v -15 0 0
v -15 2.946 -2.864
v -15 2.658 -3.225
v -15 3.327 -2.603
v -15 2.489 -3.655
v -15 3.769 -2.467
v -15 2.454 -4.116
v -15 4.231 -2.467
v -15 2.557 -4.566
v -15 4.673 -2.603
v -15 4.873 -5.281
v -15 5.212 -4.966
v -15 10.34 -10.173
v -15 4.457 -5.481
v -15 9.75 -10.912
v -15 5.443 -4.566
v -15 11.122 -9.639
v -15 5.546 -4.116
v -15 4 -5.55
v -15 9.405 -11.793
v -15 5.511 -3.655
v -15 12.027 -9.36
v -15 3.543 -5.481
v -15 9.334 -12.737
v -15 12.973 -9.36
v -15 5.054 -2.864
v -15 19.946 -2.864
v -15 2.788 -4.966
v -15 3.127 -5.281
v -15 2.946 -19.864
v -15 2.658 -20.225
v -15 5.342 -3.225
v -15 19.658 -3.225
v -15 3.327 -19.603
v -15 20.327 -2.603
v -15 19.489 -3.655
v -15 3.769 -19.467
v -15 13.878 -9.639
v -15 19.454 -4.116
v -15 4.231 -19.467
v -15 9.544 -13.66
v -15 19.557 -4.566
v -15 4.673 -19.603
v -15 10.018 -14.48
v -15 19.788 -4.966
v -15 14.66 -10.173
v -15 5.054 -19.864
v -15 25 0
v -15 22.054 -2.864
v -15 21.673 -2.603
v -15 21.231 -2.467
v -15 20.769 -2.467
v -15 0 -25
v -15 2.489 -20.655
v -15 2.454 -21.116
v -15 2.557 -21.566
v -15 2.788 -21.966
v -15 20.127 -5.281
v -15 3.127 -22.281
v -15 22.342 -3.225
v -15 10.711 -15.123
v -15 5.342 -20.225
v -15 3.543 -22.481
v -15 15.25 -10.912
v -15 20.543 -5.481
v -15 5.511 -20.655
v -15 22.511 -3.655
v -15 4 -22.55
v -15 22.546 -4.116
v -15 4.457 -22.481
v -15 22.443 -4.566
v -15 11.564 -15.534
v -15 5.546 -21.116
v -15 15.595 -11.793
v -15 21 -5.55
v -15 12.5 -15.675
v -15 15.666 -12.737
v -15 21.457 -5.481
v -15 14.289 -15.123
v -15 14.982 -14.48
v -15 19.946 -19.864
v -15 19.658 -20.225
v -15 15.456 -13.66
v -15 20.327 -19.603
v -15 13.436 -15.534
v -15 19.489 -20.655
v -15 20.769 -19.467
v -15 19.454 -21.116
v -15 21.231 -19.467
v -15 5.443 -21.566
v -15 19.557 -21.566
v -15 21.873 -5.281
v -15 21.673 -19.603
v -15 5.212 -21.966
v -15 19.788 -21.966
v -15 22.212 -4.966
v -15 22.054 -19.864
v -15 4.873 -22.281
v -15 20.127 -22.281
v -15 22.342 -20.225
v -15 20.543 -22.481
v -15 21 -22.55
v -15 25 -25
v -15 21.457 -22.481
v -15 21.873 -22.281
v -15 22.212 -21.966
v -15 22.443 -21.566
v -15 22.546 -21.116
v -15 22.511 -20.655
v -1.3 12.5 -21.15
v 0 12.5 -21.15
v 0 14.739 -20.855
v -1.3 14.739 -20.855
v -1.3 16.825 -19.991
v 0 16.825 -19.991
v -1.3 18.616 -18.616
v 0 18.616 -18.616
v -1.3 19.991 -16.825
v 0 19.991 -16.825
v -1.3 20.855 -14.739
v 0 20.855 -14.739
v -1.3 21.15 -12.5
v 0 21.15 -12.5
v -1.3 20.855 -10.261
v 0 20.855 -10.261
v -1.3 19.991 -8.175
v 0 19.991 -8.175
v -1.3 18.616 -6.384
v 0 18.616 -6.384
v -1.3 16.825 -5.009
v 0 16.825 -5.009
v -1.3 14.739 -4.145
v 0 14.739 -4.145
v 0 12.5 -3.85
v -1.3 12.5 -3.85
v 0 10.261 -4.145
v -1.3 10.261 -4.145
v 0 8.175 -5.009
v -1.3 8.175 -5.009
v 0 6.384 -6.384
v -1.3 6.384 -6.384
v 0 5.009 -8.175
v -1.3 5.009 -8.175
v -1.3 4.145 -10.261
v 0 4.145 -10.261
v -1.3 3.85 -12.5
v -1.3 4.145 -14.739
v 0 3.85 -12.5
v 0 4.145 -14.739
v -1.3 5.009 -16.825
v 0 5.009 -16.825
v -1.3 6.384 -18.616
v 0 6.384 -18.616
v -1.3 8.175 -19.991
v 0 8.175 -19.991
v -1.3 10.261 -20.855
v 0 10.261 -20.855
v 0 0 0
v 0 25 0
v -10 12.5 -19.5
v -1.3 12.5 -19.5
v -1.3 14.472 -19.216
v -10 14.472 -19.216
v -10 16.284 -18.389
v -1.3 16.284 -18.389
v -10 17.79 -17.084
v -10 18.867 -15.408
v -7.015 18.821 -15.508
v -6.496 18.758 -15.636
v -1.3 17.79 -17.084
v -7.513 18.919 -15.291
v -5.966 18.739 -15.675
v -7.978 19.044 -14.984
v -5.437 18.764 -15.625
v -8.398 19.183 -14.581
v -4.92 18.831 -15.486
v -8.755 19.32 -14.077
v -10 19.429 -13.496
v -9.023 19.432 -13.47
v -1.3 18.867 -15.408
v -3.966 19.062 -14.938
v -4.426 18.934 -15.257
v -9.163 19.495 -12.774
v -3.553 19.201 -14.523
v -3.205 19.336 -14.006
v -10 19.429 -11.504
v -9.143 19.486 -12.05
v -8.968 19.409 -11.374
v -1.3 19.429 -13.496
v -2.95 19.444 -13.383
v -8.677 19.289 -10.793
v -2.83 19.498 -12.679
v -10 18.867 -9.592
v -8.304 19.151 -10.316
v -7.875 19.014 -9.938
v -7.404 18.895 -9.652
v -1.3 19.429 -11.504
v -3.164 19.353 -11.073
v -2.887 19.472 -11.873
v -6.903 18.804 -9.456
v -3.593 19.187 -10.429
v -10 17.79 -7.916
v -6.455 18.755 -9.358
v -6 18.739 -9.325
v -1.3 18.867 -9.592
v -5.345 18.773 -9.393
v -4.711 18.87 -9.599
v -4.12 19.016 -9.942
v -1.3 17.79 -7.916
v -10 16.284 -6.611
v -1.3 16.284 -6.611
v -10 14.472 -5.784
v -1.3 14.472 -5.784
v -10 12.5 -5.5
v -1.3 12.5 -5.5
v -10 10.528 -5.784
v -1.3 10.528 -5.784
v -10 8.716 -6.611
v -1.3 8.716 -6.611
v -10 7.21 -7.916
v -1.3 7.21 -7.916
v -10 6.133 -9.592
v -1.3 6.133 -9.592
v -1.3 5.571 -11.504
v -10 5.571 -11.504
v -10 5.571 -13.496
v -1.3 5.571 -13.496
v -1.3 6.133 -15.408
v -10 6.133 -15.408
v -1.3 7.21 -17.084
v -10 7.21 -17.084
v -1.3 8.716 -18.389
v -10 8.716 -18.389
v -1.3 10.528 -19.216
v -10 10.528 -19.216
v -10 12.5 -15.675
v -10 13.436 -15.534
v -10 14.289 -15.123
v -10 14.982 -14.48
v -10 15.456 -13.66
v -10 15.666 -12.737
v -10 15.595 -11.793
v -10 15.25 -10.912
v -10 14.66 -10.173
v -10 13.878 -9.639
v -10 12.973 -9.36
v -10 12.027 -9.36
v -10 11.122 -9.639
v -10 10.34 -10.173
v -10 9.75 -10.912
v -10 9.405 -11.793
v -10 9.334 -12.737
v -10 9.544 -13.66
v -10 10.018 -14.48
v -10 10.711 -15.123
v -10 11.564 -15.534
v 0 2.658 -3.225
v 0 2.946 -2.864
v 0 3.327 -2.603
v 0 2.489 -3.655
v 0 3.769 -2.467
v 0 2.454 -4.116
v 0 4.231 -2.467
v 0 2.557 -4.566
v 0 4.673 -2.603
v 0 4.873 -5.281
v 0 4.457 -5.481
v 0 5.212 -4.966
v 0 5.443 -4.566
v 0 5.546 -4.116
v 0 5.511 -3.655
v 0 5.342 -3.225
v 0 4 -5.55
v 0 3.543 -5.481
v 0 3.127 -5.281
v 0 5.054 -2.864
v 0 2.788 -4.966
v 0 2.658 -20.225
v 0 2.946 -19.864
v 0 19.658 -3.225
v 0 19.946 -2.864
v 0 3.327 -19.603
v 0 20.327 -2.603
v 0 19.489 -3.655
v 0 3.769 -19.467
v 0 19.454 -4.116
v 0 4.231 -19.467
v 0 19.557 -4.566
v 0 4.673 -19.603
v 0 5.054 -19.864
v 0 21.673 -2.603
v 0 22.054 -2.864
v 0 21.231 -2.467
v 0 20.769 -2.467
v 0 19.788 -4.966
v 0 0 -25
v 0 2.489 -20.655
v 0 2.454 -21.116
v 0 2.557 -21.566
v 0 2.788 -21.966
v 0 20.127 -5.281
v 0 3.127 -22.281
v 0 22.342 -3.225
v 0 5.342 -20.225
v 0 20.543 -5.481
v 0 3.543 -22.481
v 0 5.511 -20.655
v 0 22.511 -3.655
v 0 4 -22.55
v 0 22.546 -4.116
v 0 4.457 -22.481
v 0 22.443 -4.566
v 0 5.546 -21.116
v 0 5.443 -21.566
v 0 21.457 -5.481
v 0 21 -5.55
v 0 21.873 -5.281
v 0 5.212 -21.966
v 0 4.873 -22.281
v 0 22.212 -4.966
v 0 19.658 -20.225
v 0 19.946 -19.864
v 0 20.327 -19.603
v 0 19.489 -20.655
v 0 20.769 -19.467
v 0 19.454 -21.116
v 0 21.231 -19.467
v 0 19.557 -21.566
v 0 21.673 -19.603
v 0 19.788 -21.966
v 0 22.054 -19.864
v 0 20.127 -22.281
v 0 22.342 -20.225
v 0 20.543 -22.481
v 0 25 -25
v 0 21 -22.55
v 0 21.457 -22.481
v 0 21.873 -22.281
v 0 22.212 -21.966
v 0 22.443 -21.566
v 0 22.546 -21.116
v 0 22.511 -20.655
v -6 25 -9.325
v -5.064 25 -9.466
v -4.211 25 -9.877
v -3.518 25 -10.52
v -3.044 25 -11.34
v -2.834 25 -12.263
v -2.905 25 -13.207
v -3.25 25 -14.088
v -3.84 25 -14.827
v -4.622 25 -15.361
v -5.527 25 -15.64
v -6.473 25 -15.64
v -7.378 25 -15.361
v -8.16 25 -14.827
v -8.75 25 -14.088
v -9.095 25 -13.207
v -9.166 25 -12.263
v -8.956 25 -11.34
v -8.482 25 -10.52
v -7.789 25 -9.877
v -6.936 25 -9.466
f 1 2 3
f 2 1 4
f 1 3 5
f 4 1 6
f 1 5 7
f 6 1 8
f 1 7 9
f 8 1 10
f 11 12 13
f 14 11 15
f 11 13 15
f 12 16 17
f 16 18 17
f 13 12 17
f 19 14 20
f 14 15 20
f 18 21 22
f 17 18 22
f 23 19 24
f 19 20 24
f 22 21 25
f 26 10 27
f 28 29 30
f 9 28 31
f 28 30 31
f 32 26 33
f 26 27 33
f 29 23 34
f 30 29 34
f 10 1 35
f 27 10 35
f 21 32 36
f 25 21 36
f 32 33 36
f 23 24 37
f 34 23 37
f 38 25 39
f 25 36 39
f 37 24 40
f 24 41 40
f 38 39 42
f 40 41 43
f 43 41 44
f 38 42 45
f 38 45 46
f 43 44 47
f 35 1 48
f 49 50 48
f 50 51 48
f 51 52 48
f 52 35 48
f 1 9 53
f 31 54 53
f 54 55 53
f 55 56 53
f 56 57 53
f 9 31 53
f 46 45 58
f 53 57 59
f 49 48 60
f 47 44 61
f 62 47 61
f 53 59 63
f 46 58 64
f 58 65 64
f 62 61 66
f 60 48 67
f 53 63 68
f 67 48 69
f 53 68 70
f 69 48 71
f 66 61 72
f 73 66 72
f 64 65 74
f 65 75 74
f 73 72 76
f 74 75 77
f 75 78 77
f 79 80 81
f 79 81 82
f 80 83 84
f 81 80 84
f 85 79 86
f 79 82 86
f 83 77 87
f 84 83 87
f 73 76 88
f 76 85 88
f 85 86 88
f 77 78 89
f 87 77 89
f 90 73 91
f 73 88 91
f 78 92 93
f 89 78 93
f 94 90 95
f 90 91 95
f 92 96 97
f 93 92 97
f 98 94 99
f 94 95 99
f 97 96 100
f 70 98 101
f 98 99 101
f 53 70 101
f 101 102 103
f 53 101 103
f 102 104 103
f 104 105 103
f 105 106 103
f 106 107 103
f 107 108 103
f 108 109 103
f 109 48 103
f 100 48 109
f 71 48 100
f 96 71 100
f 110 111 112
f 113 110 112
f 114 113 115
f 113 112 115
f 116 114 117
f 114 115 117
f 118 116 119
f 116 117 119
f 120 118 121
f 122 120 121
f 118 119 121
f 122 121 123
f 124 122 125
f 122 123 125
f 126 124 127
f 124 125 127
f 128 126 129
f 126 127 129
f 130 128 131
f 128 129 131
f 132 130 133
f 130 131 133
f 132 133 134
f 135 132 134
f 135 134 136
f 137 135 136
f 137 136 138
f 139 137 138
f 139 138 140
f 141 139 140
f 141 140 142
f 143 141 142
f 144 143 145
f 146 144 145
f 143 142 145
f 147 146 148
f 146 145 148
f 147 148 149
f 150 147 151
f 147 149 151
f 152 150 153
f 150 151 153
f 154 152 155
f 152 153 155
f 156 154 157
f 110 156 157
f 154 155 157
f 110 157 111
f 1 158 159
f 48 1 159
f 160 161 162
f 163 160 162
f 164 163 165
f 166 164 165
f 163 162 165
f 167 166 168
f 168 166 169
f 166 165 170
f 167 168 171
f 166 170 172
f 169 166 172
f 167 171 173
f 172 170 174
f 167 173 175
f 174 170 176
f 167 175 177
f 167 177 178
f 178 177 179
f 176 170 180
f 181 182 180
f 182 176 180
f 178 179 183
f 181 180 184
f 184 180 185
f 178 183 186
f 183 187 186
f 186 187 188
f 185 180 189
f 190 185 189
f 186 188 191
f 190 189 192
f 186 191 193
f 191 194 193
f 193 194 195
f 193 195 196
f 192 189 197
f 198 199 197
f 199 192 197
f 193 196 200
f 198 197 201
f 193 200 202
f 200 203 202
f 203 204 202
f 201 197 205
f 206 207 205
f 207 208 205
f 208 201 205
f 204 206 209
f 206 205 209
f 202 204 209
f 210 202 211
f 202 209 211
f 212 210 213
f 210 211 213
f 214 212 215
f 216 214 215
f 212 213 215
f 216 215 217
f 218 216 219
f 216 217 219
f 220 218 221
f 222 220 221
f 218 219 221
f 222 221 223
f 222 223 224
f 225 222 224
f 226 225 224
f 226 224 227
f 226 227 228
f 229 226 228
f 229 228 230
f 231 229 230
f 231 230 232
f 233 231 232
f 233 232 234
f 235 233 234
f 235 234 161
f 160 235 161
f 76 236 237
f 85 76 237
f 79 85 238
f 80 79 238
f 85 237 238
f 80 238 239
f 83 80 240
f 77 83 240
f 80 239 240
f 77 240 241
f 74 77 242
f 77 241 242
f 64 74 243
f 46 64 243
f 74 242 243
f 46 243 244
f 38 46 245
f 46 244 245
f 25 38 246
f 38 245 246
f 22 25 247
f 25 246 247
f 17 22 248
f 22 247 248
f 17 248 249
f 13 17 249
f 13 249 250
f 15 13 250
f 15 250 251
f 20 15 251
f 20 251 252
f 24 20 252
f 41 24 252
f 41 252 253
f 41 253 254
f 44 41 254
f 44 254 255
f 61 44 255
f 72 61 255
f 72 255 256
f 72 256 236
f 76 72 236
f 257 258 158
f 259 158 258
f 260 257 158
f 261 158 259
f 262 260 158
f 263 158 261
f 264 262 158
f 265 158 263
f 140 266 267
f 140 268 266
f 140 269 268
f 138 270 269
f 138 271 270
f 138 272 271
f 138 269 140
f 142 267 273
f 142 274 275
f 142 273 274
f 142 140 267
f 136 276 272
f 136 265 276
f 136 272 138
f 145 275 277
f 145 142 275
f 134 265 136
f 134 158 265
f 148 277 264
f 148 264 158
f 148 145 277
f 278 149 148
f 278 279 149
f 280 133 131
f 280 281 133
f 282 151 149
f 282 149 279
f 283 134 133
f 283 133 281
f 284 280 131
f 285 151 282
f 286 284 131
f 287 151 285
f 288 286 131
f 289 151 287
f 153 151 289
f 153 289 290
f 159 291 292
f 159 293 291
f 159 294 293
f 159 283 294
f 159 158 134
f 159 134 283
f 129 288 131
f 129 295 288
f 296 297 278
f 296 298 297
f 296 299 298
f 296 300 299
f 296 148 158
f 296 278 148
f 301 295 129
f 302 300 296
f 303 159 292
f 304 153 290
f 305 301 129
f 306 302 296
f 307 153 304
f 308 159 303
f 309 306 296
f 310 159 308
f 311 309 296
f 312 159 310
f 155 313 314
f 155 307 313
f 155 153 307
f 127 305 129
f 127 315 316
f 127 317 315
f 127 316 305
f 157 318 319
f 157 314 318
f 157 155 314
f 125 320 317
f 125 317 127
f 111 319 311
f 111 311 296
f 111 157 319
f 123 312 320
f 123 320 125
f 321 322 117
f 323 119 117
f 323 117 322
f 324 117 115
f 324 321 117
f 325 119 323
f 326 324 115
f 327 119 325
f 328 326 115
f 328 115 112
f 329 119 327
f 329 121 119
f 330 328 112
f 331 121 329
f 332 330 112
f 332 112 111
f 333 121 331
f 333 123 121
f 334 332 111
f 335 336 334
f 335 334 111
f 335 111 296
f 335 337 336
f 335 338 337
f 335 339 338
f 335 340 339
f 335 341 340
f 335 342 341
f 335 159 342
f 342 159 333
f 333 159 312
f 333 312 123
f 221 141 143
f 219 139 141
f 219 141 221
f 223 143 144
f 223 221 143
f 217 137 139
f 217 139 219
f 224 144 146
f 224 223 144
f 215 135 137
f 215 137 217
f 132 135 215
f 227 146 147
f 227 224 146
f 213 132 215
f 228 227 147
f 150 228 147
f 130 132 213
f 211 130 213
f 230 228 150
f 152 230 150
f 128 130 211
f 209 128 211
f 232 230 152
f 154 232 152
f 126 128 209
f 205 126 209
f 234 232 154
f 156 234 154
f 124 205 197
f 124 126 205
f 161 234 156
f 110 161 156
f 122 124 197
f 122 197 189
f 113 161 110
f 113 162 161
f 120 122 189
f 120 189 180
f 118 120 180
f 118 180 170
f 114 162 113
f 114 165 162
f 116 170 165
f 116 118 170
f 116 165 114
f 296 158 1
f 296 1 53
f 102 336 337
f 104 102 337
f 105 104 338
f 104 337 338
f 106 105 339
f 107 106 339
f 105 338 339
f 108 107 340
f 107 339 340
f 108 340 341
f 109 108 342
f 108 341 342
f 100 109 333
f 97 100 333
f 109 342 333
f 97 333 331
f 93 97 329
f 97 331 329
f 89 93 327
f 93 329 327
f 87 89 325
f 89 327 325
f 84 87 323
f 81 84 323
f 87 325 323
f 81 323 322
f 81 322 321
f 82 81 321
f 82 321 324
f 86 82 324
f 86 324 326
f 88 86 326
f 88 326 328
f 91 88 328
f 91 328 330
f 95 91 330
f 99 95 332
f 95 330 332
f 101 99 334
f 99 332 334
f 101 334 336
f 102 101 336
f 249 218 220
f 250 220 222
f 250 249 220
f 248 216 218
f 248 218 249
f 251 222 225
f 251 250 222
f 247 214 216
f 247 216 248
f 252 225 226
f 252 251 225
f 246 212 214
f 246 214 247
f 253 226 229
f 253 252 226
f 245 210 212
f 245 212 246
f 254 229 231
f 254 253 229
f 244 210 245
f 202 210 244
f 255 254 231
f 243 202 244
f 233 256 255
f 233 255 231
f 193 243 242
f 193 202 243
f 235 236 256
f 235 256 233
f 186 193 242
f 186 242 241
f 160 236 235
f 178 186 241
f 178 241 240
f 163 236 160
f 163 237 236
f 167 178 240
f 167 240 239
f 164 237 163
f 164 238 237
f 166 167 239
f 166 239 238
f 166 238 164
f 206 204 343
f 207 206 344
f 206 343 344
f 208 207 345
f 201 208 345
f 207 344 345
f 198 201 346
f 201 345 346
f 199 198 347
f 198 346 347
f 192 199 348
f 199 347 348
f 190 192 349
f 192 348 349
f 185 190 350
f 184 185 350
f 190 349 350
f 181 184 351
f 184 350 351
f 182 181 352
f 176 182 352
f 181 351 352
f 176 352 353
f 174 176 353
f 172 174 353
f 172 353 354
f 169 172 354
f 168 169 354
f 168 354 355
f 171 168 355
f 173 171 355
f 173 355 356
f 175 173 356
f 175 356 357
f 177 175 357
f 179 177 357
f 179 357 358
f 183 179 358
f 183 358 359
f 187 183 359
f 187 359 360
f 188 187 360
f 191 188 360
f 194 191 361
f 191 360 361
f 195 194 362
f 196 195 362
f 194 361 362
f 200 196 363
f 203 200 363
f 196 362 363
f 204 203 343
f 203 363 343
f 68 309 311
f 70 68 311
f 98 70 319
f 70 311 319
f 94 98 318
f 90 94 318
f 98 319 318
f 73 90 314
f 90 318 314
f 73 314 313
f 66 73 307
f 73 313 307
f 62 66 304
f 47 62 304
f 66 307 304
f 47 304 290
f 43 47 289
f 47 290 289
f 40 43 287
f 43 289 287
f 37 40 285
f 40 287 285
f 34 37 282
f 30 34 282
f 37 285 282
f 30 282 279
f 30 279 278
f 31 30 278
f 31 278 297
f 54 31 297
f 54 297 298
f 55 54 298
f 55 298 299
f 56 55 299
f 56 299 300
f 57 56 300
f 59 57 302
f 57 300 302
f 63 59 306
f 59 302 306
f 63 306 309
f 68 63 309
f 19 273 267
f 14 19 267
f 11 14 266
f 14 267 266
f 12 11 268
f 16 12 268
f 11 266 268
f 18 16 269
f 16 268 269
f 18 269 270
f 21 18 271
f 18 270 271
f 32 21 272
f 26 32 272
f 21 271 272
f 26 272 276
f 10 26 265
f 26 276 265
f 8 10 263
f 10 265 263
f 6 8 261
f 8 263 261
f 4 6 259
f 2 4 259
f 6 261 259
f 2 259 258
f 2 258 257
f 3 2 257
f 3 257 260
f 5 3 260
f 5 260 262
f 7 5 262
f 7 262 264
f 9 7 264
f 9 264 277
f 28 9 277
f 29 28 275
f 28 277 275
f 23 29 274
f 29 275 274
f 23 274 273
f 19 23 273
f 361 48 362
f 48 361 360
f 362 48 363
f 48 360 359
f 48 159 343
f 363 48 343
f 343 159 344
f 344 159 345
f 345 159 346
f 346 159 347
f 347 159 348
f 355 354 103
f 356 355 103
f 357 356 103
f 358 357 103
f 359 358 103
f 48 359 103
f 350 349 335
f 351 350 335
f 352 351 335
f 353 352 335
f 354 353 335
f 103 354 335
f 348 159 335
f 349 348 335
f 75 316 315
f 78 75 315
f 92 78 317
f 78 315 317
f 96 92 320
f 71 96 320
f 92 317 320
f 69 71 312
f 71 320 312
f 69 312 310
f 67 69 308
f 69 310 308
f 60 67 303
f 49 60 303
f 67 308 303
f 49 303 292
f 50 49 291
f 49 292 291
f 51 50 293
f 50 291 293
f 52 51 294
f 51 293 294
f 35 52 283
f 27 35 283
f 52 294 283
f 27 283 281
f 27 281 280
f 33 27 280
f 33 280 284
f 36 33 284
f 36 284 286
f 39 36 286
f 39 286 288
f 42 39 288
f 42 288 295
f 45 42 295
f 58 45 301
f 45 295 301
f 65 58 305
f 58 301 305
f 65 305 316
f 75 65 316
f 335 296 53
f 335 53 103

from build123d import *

# Parameters (mm, degrees)
SKETCH1_W          = 25
SKETCH1_H          = 25
SKETCH1_R          = 1.55
EXTRUDE1_DEPTH     = 15
SKETCH2_R          = 7
CUT_EXTRUDE1_DEPTH = 10
SKETCH3_R          = 3.175
CUT_EXTRUDE2_DEPTH = 39.405728739
SKETCH4_R          = 3.175
CUT_EXTRUDE3_DEPTH = 10
SKETCH7_R          = 8.65
CUT_EXTRUDE4_DEPTH = 1.3


with BuildPart() as part:
    # Sketch1 → Extrude1 (new body)
    with BuildSketch(Plane(origin=(0, 0, 0), x_dir=(0, 0, -1), z_dir=(1, 0, 0))):
        with Locations((12.5, 12.5)):
            Rectangle(SKETCH1_W, SKETCH1_H)
        with Locations((4, 4)):
            Circle(SKETCH1_R, mode=Mode.SUBTRACT)
        with Locations((4, 21)):
            Circle(SKETCH1_R, mode=Mode.SUBTRACT)
        with Locations((21, 21)):
            Circle(SKETCH1_R, mode=Mode.SUBTRACT)
        with Locations((21, 4)):
            Circle(SKETCH1_R, mode=Mode.SUBTRACT)
    extrude(amount=-EXTRUDE1_DEPTH)

    # Sketch2 → Cut-Extrude1 (cut)
    with BuildSketch(Plane(origin=(0, 0, 0), x_dir=(0, 0, -1), z_dir=(1, 0, 0))):
        with Locations((12.5, 12.5)):
            Circle(SKETCH2_R)
    extrude(amount=-CUT_EXTRUDE1_DEPTH, mode=Mode.SUBTRACT)

    # Sketch3 → Cut-Extrude2 (cut, through all)
    with BuildSketch(Plane(origin=(0, 0, 0), x_dir=(0, 0, -1), z_dir=(1, 0, 0))):
        with Locations((12.5, 12.5)):
            Circle(SKETCH3_R)
    extrude(amount=-CUT_EXTRUDE2_DEPTH, mode=Mode.SUBTRACT)

    # Sketch4 → Cut-Extrude3 (cut)
    with BuildSketch(Plane(origin=(0, 25, 0), x_dir=(1, 0, 0), z_dir=(0, 1, 0))):
        with Locations(Location((-6, 12.5, 0), (0, 0, 270))):
            Circle(SKETCH4_R)
    extrude(amount=-CUT_EXTRUDE3_DEPTH, mode=Mode.SUBTRACT)

    # Sketch7 → Cut-Extrude4 (cut)
    with BuildSketch(Plane(origin=(0, 0, 0), x_dir=(0, 0, -1), z_dir=(1, 0, 0))):
        with Locations((12.5, 12.5)):
            Circle(SKETCH7_R)
    extrude(amount=-CUT_EXTRUDE4_DEPTH, mode=Mode.SUBTRACT)


solid = part.part
